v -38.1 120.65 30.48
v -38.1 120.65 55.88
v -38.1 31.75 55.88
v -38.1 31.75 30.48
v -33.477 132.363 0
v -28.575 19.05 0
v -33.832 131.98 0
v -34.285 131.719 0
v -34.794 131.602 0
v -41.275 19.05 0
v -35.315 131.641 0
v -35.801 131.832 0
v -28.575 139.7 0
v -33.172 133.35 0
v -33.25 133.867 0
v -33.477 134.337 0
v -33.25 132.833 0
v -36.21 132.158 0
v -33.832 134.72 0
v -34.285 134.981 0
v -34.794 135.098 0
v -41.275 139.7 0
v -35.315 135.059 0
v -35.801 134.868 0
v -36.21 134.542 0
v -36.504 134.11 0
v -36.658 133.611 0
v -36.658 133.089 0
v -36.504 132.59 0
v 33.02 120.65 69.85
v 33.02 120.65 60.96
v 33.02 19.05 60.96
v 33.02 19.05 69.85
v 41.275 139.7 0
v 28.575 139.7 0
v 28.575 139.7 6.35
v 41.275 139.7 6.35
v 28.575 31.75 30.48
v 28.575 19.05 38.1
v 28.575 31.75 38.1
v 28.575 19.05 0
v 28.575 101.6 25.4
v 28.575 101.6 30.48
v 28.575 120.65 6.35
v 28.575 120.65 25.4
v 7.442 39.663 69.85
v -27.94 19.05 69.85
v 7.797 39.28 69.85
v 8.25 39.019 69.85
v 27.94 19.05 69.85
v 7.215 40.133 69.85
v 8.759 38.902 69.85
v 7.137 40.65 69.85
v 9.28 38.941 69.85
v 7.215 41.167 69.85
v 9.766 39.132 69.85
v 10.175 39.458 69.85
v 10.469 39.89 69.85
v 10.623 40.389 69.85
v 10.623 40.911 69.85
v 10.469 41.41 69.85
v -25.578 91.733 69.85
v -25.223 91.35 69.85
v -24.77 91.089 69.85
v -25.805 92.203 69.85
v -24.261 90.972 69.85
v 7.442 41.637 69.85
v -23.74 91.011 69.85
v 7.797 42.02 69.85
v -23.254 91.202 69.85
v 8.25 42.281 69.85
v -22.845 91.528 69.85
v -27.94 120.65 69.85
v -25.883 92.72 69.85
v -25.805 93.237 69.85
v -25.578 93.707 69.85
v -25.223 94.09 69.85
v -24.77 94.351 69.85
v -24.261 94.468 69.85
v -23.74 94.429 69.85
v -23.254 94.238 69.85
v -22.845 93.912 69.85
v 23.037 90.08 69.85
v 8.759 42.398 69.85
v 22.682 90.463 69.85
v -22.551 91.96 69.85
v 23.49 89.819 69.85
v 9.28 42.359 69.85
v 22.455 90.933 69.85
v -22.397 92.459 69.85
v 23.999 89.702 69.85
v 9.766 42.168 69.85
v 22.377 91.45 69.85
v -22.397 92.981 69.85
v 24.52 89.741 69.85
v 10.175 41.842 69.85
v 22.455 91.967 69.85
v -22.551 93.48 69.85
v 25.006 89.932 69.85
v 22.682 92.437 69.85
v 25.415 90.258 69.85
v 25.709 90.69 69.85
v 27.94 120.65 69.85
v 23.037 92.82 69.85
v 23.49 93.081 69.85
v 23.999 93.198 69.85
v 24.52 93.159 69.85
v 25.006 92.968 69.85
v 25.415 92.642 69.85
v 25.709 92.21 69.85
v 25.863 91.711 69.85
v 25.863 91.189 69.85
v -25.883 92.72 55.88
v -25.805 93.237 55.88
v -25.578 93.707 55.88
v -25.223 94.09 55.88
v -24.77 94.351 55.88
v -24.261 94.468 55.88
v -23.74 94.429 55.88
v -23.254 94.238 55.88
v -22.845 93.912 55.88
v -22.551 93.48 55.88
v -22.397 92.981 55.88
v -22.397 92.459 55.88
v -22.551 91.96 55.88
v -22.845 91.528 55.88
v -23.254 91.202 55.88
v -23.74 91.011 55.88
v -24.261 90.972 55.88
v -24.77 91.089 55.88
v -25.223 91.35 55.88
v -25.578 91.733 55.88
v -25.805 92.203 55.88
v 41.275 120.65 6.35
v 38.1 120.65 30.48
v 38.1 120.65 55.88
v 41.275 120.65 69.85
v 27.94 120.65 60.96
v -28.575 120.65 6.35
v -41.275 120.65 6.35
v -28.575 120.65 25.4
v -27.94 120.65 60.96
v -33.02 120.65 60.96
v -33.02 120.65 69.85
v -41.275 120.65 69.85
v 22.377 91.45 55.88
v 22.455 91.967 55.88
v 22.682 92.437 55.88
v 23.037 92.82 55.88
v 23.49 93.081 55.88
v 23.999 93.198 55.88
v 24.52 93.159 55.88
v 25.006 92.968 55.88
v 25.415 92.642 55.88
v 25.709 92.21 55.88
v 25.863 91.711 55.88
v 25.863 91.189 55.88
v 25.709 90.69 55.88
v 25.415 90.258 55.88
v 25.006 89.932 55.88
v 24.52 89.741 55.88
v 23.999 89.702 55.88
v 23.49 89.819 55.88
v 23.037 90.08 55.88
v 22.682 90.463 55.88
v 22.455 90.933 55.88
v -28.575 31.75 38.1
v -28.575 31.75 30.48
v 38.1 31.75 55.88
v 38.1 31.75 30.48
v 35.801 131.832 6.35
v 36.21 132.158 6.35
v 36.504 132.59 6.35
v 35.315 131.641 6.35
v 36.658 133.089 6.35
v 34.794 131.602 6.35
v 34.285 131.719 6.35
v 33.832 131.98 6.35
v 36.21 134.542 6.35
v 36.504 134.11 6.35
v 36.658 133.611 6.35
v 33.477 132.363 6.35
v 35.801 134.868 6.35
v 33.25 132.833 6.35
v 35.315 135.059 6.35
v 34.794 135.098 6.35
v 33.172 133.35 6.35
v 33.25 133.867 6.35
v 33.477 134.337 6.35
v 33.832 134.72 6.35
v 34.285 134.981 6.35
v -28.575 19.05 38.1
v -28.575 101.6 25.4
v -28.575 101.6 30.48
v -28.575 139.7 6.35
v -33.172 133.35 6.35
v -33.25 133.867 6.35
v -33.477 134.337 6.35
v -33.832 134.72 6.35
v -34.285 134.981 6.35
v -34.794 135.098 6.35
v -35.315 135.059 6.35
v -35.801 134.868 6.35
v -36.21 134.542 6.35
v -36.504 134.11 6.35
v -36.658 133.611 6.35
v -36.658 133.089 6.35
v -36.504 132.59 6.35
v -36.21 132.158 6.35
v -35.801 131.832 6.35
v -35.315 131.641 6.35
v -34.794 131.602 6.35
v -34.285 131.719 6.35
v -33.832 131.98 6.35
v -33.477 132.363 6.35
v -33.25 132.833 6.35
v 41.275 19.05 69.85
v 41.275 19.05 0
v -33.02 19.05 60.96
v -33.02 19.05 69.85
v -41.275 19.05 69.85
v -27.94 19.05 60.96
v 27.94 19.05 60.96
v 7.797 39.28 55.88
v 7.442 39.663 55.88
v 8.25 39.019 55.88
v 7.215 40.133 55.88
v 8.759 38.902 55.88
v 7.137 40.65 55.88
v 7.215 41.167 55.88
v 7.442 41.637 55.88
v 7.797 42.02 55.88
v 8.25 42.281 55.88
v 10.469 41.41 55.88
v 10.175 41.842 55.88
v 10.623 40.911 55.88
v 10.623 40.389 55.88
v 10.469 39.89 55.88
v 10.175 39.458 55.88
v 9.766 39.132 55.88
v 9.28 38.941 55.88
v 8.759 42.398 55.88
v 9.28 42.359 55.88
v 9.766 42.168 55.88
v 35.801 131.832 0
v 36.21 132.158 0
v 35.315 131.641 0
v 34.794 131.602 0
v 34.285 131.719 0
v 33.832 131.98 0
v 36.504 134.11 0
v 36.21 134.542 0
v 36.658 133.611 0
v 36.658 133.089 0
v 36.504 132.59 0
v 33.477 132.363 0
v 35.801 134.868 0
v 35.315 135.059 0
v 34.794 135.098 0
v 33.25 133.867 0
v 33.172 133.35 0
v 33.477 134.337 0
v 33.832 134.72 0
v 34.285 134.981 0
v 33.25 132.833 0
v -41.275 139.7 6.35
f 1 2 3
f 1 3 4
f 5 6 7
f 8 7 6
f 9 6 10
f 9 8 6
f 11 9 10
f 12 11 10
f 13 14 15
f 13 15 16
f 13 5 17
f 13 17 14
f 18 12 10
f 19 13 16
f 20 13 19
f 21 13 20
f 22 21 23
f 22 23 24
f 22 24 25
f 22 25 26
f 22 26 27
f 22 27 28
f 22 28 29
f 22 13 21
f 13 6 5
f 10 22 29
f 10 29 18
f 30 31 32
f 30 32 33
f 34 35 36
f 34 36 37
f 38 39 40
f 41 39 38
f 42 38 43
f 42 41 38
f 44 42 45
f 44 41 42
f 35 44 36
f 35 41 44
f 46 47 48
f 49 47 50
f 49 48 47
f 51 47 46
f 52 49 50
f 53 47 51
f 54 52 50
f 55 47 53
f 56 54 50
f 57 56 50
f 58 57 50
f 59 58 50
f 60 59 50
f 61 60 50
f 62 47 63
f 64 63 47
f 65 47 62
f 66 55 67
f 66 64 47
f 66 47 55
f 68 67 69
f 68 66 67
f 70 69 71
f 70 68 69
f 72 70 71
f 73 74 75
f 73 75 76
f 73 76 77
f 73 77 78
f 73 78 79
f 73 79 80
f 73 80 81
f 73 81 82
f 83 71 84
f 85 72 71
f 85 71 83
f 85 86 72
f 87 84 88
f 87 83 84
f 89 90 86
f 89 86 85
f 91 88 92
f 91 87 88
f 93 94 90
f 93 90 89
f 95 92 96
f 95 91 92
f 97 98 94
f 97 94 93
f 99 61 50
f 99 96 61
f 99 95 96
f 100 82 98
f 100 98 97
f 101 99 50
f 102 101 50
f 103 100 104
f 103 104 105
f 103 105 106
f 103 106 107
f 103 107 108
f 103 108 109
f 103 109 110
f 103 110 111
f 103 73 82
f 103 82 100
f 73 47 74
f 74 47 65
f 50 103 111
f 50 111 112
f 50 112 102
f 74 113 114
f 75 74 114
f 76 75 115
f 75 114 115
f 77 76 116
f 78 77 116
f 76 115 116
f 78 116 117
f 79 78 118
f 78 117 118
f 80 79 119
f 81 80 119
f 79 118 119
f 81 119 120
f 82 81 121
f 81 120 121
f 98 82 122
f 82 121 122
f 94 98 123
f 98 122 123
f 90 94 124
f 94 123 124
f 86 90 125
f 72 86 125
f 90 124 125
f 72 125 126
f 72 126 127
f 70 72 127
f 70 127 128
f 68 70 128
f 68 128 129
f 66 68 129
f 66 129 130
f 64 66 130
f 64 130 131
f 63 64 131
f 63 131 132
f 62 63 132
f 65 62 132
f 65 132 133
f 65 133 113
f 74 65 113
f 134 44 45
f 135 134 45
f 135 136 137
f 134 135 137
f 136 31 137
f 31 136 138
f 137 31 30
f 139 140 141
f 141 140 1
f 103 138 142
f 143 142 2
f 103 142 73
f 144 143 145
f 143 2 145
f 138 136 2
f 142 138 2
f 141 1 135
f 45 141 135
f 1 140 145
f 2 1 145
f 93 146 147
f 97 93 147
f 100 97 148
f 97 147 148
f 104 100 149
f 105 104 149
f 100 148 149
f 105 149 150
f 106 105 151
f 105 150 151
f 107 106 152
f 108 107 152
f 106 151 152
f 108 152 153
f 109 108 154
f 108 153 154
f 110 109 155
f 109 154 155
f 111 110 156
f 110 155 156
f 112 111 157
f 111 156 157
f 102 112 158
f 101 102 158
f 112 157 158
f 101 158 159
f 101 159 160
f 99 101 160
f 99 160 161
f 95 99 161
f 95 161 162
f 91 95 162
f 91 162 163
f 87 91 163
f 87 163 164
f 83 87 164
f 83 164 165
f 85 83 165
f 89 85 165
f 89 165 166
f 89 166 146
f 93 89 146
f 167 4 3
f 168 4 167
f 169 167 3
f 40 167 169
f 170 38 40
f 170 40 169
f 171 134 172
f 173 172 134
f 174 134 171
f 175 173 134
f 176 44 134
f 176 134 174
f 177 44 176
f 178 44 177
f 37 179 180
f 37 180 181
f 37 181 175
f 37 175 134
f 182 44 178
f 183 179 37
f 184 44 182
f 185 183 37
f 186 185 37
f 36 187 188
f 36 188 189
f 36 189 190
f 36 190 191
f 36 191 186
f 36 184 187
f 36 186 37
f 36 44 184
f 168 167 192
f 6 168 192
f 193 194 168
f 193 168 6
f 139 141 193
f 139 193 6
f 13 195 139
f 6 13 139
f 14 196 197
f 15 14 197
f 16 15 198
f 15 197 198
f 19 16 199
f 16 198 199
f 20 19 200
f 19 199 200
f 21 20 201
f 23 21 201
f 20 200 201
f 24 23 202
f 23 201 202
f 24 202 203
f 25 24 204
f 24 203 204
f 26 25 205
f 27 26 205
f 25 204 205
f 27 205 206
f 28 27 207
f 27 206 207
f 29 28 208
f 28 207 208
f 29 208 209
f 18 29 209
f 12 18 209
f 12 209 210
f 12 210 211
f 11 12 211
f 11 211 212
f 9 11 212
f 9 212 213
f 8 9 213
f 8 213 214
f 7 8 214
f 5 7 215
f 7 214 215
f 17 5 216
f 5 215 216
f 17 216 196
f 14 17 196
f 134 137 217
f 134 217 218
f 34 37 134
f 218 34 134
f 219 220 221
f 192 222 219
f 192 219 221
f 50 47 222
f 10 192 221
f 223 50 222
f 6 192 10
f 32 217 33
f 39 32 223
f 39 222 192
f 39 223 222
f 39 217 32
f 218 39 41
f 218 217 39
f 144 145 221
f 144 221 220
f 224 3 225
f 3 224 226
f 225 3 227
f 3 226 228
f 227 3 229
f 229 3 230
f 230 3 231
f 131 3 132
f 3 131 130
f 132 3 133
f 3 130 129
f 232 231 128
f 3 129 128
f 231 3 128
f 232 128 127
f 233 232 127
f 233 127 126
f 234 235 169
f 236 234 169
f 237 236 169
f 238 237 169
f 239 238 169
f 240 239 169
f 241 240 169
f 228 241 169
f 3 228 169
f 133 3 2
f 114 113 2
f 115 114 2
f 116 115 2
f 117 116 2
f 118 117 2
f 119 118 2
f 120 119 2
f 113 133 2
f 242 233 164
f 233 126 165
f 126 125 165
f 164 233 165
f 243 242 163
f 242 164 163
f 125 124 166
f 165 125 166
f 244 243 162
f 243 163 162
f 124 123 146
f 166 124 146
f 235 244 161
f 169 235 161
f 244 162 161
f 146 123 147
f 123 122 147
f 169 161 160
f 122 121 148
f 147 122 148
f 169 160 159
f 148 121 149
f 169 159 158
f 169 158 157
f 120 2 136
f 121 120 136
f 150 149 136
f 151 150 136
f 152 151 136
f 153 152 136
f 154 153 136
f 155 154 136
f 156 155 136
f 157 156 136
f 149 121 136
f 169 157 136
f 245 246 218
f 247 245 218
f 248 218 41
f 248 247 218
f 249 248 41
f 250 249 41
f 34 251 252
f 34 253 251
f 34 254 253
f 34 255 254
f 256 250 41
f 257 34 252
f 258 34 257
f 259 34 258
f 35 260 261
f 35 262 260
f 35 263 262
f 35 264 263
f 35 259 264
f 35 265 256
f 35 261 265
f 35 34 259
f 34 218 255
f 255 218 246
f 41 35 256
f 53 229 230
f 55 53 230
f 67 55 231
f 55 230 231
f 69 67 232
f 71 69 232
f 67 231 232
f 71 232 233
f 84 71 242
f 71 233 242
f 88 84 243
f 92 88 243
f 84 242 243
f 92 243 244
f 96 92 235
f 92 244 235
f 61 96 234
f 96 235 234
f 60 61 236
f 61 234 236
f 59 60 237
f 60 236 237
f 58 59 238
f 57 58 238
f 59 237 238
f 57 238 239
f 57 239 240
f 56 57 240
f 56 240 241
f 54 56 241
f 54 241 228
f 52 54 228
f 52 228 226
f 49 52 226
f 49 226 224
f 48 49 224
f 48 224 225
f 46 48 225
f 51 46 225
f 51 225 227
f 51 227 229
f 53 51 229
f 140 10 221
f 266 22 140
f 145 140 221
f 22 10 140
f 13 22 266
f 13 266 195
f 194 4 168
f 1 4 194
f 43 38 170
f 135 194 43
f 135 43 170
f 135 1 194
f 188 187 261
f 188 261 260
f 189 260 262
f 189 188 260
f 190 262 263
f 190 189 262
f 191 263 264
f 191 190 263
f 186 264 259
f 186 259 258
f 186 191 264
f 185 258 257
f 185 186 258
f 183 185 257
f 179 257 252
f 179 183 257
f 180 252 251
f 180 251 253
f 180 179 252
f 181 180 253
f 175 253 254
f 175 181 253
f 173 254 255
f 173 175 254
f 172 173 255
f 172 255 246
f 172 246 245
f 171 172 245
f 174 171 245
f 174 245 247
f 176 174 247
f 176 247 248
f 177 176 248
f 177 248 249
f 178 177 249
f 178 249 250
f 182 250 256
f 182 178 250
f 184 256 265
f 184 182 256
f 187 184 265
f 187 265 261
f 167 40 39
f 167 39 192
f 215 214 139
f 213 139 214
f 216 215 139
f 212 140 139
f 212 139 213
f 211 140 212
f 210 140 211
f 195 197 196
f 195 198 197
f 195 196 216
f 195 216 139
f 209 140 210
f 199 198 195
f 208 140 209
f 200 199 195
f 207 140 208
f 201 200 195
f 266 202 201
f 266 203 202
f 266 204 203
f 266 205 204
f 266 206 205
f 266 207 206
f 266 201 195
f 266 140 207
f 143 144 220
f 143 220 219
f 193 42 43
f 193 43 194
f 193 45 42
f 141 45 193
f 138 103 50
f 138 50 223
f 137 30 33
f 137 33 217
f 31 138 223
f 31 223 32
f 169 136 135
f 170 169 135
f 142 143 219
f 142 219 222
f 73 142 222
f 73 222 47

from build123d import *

# Parameters (mm, degrees)
SKETCH1_W                       = 82.55
SKETCH1_H                       = 120.65
BOSS_EXTRUDE1_DEPTH             = 69.85
SKETCH2_W                       = 76.2
SKETCH2_H                       = 25.4
CUT_EXTRUDE1_DEPTH              = 107.95
SKETCH3_W                       = 5.08
SKETCH3_H                       = 101.6
CUT_EXTRUDE2_DEPTH              = 8.89
SKETCH4_W                       = 63.5
SKETCH4_H                       = 19.05
CUT_EXTRUDE3_DEPTH              = 83.55
SKETCH5_W                       = 57.15
SKETCH5_H                       = 25.4
CUT_EXTRUDE4_DEPTH              = 121.65
F_40_0_138_DIAMETER_HOLE1_D     = 3.5052
F_40_0_138_DIAMETER_HOLE1_DEPTH = 13.97
BOSS_EXTRUDE2_DEPTH             = 6.35
SKETCH15_W                      = 57.15
SKETCH15_H                      = 88.9
CUT_EXTRUDE5_DEPTH              = 12.7
SKETCH16_W                      = 69.85
SKETCH16_H                      = 6.35
CUT_EXTRUDE6_DEPTH              = 83.55
SKETCH17_R                      = 1.7526
CUT_EXTRUDE7_DEPTH              = 6.35


with BuildPart() as part:
    # Sketch1 → Boss-Extrude1 (new body)
    with BuildSketch(Plane.XY):
        with Locations((0, 79.375)):
            Rectangle(SKETCH1_W, SKETCH1_H)
    extrude(amount=BOSS_EXTRUDE1_DEPTH)

    # Sketch2 → Cut-Extrude1 (cut)
    with BuildSketch(Plane(origin=(0, 139.7, 0), x_dir=(1, 0, 0), z_dir=(0, 1, 0))):
        with Locations((0, -43.18)):
            Rectangle(SKETCH2_W, SKETCH2_H)
    extrude(amount=-CUT_EXTRUDE1_DEPTH, mode=Mode.SUBTRACT)

    # Sketch3 → Cut-Extrude2 (cut)
    with BuildSketch(Plane.XY.offset(69.85)):
        with Locations((30.48, 69.85)):
            Rectangle(SKETCH3_W, SKETCH3_H)
    cut_extrude2 = extrude(amount=-CUT_EXTRUDE2_DEPTH, mode=Mode.SUBTRACT)

    # Mirror1: Cut-Extrude2 across plane
    add(cut_extrude2.mirror(Plane(origin=(0, 0, 0), x_dir=(0, 0, 1), z_dir=(1, 0, 0))), mode=Mode.SUBTRACT)

    # Sketch4 → Cut-Extrude3 (cut, through all)
    with BuildSketch(Plane.ZY.offset(41.275)):
        with Locations((38.1, 130.175)):
            Rectangle(SKETCH4_W, SKETCH4_H)
    extrude(amount=-CUT_EXTRUDE3_DEPTH, mode=Mode.SUBTRACT)

    # Sketch5 → Cut-Extrude4 (cut, through all)
    with BuildSketch(Plane(origin=(0, 139.7, 0), x_dir=(1, 0, 0), z_dir=(0, 1, 0))):
        with Locations((0, -12.7)):
            Rectangle(SKETCH5_W, SKETCH5_H)
    extrude(amount=-CUT_EXTRUDE4_DEPTH, mode=Mode.SUBTRACT)

    # #40 (0.138) Diameter Hole1
    with Locations(Plane.XY.offset(69.85)):
        with Locations((-24.130002345, 92.720002179), (24.129997606, 91.450000321), (8.889995651, 40.650000908)):
            Hole(F_40_0_138_DIAMETER_HOLE1_D / 2, depth=F_40_0_138_DIAMETER_HOLE1_DEPTH)

    # Sketch14 → Boss-Extrude2 (add)
    with BuildSketch(Plane.XZ.offset(-19.05)):
        Polygon((-41.275, 69.85), (-33.02, 69.85), (-33.02, 60.96), (-27.94, 60.96), (-27.94, 69.85), (27.94, 69.85), (27.94, 60.96), (33.02, 60.96), (33.02, 69.85), (41.275, 69.85), (41.275, 0), (28.575, 0), (28.575, 25.4), (-28.575, 25.4), (-28.575, 0), (-41.275, 0), align=None)
    extrude(amount=BOSS_EXTRUDE2_DEPTH)

    # Sketch15 → Cut-Extrude5 (cut)
    with BuildSketch(Plane(origin=(0, 0, 25.4), x_dir=(-1, 0, 0), z_dir=(0, 0, -1))):
        with Locations((0, 57.15)):
            Rectangle(SKETCH15_W, SKETCH15_H)
    extrude(amount=-CUT_EXTRUDE5_DEPTH, mode=Mode.SUBTRACT)

    # Sketch16 → Cut-Extrude6 (cut, through all)
    with BuildSketch(Plane(origin=(41.275, 0, 0), x_dir=(0, 0, -1), z_dir=(1, 0, 0))):
        with Locations((-34.925, 15.875)):
            Rectangle(SKETCH16_W, SKETCH16_H)
    extrude(amount=-CUT_EXTRUDE6_DEPTH, mode=Mode.SUBTRACT)

    # Sketch17 → Cut-Extrude7 (cut)
    with BuildSketch(Plane.XY.offset(6.35)):
        with Locations((-34.925, 133.35)):
            Circle(SKETCH17_R)
    cut_extrude7 = extrude(amount=-CUT_EXTRUDE7_DEPTH, mode=Mode.SUBTRACT)

    # Mirror2: Cut-Extrude7 across plane
    add(cut_extrude7.mirror(Plane(origin=(0, 0, 0), x_dir=(0, 0, 1), z_dir=(1, 0, 0))), mode=Mode.SUBTRACT)


solid = part.part
